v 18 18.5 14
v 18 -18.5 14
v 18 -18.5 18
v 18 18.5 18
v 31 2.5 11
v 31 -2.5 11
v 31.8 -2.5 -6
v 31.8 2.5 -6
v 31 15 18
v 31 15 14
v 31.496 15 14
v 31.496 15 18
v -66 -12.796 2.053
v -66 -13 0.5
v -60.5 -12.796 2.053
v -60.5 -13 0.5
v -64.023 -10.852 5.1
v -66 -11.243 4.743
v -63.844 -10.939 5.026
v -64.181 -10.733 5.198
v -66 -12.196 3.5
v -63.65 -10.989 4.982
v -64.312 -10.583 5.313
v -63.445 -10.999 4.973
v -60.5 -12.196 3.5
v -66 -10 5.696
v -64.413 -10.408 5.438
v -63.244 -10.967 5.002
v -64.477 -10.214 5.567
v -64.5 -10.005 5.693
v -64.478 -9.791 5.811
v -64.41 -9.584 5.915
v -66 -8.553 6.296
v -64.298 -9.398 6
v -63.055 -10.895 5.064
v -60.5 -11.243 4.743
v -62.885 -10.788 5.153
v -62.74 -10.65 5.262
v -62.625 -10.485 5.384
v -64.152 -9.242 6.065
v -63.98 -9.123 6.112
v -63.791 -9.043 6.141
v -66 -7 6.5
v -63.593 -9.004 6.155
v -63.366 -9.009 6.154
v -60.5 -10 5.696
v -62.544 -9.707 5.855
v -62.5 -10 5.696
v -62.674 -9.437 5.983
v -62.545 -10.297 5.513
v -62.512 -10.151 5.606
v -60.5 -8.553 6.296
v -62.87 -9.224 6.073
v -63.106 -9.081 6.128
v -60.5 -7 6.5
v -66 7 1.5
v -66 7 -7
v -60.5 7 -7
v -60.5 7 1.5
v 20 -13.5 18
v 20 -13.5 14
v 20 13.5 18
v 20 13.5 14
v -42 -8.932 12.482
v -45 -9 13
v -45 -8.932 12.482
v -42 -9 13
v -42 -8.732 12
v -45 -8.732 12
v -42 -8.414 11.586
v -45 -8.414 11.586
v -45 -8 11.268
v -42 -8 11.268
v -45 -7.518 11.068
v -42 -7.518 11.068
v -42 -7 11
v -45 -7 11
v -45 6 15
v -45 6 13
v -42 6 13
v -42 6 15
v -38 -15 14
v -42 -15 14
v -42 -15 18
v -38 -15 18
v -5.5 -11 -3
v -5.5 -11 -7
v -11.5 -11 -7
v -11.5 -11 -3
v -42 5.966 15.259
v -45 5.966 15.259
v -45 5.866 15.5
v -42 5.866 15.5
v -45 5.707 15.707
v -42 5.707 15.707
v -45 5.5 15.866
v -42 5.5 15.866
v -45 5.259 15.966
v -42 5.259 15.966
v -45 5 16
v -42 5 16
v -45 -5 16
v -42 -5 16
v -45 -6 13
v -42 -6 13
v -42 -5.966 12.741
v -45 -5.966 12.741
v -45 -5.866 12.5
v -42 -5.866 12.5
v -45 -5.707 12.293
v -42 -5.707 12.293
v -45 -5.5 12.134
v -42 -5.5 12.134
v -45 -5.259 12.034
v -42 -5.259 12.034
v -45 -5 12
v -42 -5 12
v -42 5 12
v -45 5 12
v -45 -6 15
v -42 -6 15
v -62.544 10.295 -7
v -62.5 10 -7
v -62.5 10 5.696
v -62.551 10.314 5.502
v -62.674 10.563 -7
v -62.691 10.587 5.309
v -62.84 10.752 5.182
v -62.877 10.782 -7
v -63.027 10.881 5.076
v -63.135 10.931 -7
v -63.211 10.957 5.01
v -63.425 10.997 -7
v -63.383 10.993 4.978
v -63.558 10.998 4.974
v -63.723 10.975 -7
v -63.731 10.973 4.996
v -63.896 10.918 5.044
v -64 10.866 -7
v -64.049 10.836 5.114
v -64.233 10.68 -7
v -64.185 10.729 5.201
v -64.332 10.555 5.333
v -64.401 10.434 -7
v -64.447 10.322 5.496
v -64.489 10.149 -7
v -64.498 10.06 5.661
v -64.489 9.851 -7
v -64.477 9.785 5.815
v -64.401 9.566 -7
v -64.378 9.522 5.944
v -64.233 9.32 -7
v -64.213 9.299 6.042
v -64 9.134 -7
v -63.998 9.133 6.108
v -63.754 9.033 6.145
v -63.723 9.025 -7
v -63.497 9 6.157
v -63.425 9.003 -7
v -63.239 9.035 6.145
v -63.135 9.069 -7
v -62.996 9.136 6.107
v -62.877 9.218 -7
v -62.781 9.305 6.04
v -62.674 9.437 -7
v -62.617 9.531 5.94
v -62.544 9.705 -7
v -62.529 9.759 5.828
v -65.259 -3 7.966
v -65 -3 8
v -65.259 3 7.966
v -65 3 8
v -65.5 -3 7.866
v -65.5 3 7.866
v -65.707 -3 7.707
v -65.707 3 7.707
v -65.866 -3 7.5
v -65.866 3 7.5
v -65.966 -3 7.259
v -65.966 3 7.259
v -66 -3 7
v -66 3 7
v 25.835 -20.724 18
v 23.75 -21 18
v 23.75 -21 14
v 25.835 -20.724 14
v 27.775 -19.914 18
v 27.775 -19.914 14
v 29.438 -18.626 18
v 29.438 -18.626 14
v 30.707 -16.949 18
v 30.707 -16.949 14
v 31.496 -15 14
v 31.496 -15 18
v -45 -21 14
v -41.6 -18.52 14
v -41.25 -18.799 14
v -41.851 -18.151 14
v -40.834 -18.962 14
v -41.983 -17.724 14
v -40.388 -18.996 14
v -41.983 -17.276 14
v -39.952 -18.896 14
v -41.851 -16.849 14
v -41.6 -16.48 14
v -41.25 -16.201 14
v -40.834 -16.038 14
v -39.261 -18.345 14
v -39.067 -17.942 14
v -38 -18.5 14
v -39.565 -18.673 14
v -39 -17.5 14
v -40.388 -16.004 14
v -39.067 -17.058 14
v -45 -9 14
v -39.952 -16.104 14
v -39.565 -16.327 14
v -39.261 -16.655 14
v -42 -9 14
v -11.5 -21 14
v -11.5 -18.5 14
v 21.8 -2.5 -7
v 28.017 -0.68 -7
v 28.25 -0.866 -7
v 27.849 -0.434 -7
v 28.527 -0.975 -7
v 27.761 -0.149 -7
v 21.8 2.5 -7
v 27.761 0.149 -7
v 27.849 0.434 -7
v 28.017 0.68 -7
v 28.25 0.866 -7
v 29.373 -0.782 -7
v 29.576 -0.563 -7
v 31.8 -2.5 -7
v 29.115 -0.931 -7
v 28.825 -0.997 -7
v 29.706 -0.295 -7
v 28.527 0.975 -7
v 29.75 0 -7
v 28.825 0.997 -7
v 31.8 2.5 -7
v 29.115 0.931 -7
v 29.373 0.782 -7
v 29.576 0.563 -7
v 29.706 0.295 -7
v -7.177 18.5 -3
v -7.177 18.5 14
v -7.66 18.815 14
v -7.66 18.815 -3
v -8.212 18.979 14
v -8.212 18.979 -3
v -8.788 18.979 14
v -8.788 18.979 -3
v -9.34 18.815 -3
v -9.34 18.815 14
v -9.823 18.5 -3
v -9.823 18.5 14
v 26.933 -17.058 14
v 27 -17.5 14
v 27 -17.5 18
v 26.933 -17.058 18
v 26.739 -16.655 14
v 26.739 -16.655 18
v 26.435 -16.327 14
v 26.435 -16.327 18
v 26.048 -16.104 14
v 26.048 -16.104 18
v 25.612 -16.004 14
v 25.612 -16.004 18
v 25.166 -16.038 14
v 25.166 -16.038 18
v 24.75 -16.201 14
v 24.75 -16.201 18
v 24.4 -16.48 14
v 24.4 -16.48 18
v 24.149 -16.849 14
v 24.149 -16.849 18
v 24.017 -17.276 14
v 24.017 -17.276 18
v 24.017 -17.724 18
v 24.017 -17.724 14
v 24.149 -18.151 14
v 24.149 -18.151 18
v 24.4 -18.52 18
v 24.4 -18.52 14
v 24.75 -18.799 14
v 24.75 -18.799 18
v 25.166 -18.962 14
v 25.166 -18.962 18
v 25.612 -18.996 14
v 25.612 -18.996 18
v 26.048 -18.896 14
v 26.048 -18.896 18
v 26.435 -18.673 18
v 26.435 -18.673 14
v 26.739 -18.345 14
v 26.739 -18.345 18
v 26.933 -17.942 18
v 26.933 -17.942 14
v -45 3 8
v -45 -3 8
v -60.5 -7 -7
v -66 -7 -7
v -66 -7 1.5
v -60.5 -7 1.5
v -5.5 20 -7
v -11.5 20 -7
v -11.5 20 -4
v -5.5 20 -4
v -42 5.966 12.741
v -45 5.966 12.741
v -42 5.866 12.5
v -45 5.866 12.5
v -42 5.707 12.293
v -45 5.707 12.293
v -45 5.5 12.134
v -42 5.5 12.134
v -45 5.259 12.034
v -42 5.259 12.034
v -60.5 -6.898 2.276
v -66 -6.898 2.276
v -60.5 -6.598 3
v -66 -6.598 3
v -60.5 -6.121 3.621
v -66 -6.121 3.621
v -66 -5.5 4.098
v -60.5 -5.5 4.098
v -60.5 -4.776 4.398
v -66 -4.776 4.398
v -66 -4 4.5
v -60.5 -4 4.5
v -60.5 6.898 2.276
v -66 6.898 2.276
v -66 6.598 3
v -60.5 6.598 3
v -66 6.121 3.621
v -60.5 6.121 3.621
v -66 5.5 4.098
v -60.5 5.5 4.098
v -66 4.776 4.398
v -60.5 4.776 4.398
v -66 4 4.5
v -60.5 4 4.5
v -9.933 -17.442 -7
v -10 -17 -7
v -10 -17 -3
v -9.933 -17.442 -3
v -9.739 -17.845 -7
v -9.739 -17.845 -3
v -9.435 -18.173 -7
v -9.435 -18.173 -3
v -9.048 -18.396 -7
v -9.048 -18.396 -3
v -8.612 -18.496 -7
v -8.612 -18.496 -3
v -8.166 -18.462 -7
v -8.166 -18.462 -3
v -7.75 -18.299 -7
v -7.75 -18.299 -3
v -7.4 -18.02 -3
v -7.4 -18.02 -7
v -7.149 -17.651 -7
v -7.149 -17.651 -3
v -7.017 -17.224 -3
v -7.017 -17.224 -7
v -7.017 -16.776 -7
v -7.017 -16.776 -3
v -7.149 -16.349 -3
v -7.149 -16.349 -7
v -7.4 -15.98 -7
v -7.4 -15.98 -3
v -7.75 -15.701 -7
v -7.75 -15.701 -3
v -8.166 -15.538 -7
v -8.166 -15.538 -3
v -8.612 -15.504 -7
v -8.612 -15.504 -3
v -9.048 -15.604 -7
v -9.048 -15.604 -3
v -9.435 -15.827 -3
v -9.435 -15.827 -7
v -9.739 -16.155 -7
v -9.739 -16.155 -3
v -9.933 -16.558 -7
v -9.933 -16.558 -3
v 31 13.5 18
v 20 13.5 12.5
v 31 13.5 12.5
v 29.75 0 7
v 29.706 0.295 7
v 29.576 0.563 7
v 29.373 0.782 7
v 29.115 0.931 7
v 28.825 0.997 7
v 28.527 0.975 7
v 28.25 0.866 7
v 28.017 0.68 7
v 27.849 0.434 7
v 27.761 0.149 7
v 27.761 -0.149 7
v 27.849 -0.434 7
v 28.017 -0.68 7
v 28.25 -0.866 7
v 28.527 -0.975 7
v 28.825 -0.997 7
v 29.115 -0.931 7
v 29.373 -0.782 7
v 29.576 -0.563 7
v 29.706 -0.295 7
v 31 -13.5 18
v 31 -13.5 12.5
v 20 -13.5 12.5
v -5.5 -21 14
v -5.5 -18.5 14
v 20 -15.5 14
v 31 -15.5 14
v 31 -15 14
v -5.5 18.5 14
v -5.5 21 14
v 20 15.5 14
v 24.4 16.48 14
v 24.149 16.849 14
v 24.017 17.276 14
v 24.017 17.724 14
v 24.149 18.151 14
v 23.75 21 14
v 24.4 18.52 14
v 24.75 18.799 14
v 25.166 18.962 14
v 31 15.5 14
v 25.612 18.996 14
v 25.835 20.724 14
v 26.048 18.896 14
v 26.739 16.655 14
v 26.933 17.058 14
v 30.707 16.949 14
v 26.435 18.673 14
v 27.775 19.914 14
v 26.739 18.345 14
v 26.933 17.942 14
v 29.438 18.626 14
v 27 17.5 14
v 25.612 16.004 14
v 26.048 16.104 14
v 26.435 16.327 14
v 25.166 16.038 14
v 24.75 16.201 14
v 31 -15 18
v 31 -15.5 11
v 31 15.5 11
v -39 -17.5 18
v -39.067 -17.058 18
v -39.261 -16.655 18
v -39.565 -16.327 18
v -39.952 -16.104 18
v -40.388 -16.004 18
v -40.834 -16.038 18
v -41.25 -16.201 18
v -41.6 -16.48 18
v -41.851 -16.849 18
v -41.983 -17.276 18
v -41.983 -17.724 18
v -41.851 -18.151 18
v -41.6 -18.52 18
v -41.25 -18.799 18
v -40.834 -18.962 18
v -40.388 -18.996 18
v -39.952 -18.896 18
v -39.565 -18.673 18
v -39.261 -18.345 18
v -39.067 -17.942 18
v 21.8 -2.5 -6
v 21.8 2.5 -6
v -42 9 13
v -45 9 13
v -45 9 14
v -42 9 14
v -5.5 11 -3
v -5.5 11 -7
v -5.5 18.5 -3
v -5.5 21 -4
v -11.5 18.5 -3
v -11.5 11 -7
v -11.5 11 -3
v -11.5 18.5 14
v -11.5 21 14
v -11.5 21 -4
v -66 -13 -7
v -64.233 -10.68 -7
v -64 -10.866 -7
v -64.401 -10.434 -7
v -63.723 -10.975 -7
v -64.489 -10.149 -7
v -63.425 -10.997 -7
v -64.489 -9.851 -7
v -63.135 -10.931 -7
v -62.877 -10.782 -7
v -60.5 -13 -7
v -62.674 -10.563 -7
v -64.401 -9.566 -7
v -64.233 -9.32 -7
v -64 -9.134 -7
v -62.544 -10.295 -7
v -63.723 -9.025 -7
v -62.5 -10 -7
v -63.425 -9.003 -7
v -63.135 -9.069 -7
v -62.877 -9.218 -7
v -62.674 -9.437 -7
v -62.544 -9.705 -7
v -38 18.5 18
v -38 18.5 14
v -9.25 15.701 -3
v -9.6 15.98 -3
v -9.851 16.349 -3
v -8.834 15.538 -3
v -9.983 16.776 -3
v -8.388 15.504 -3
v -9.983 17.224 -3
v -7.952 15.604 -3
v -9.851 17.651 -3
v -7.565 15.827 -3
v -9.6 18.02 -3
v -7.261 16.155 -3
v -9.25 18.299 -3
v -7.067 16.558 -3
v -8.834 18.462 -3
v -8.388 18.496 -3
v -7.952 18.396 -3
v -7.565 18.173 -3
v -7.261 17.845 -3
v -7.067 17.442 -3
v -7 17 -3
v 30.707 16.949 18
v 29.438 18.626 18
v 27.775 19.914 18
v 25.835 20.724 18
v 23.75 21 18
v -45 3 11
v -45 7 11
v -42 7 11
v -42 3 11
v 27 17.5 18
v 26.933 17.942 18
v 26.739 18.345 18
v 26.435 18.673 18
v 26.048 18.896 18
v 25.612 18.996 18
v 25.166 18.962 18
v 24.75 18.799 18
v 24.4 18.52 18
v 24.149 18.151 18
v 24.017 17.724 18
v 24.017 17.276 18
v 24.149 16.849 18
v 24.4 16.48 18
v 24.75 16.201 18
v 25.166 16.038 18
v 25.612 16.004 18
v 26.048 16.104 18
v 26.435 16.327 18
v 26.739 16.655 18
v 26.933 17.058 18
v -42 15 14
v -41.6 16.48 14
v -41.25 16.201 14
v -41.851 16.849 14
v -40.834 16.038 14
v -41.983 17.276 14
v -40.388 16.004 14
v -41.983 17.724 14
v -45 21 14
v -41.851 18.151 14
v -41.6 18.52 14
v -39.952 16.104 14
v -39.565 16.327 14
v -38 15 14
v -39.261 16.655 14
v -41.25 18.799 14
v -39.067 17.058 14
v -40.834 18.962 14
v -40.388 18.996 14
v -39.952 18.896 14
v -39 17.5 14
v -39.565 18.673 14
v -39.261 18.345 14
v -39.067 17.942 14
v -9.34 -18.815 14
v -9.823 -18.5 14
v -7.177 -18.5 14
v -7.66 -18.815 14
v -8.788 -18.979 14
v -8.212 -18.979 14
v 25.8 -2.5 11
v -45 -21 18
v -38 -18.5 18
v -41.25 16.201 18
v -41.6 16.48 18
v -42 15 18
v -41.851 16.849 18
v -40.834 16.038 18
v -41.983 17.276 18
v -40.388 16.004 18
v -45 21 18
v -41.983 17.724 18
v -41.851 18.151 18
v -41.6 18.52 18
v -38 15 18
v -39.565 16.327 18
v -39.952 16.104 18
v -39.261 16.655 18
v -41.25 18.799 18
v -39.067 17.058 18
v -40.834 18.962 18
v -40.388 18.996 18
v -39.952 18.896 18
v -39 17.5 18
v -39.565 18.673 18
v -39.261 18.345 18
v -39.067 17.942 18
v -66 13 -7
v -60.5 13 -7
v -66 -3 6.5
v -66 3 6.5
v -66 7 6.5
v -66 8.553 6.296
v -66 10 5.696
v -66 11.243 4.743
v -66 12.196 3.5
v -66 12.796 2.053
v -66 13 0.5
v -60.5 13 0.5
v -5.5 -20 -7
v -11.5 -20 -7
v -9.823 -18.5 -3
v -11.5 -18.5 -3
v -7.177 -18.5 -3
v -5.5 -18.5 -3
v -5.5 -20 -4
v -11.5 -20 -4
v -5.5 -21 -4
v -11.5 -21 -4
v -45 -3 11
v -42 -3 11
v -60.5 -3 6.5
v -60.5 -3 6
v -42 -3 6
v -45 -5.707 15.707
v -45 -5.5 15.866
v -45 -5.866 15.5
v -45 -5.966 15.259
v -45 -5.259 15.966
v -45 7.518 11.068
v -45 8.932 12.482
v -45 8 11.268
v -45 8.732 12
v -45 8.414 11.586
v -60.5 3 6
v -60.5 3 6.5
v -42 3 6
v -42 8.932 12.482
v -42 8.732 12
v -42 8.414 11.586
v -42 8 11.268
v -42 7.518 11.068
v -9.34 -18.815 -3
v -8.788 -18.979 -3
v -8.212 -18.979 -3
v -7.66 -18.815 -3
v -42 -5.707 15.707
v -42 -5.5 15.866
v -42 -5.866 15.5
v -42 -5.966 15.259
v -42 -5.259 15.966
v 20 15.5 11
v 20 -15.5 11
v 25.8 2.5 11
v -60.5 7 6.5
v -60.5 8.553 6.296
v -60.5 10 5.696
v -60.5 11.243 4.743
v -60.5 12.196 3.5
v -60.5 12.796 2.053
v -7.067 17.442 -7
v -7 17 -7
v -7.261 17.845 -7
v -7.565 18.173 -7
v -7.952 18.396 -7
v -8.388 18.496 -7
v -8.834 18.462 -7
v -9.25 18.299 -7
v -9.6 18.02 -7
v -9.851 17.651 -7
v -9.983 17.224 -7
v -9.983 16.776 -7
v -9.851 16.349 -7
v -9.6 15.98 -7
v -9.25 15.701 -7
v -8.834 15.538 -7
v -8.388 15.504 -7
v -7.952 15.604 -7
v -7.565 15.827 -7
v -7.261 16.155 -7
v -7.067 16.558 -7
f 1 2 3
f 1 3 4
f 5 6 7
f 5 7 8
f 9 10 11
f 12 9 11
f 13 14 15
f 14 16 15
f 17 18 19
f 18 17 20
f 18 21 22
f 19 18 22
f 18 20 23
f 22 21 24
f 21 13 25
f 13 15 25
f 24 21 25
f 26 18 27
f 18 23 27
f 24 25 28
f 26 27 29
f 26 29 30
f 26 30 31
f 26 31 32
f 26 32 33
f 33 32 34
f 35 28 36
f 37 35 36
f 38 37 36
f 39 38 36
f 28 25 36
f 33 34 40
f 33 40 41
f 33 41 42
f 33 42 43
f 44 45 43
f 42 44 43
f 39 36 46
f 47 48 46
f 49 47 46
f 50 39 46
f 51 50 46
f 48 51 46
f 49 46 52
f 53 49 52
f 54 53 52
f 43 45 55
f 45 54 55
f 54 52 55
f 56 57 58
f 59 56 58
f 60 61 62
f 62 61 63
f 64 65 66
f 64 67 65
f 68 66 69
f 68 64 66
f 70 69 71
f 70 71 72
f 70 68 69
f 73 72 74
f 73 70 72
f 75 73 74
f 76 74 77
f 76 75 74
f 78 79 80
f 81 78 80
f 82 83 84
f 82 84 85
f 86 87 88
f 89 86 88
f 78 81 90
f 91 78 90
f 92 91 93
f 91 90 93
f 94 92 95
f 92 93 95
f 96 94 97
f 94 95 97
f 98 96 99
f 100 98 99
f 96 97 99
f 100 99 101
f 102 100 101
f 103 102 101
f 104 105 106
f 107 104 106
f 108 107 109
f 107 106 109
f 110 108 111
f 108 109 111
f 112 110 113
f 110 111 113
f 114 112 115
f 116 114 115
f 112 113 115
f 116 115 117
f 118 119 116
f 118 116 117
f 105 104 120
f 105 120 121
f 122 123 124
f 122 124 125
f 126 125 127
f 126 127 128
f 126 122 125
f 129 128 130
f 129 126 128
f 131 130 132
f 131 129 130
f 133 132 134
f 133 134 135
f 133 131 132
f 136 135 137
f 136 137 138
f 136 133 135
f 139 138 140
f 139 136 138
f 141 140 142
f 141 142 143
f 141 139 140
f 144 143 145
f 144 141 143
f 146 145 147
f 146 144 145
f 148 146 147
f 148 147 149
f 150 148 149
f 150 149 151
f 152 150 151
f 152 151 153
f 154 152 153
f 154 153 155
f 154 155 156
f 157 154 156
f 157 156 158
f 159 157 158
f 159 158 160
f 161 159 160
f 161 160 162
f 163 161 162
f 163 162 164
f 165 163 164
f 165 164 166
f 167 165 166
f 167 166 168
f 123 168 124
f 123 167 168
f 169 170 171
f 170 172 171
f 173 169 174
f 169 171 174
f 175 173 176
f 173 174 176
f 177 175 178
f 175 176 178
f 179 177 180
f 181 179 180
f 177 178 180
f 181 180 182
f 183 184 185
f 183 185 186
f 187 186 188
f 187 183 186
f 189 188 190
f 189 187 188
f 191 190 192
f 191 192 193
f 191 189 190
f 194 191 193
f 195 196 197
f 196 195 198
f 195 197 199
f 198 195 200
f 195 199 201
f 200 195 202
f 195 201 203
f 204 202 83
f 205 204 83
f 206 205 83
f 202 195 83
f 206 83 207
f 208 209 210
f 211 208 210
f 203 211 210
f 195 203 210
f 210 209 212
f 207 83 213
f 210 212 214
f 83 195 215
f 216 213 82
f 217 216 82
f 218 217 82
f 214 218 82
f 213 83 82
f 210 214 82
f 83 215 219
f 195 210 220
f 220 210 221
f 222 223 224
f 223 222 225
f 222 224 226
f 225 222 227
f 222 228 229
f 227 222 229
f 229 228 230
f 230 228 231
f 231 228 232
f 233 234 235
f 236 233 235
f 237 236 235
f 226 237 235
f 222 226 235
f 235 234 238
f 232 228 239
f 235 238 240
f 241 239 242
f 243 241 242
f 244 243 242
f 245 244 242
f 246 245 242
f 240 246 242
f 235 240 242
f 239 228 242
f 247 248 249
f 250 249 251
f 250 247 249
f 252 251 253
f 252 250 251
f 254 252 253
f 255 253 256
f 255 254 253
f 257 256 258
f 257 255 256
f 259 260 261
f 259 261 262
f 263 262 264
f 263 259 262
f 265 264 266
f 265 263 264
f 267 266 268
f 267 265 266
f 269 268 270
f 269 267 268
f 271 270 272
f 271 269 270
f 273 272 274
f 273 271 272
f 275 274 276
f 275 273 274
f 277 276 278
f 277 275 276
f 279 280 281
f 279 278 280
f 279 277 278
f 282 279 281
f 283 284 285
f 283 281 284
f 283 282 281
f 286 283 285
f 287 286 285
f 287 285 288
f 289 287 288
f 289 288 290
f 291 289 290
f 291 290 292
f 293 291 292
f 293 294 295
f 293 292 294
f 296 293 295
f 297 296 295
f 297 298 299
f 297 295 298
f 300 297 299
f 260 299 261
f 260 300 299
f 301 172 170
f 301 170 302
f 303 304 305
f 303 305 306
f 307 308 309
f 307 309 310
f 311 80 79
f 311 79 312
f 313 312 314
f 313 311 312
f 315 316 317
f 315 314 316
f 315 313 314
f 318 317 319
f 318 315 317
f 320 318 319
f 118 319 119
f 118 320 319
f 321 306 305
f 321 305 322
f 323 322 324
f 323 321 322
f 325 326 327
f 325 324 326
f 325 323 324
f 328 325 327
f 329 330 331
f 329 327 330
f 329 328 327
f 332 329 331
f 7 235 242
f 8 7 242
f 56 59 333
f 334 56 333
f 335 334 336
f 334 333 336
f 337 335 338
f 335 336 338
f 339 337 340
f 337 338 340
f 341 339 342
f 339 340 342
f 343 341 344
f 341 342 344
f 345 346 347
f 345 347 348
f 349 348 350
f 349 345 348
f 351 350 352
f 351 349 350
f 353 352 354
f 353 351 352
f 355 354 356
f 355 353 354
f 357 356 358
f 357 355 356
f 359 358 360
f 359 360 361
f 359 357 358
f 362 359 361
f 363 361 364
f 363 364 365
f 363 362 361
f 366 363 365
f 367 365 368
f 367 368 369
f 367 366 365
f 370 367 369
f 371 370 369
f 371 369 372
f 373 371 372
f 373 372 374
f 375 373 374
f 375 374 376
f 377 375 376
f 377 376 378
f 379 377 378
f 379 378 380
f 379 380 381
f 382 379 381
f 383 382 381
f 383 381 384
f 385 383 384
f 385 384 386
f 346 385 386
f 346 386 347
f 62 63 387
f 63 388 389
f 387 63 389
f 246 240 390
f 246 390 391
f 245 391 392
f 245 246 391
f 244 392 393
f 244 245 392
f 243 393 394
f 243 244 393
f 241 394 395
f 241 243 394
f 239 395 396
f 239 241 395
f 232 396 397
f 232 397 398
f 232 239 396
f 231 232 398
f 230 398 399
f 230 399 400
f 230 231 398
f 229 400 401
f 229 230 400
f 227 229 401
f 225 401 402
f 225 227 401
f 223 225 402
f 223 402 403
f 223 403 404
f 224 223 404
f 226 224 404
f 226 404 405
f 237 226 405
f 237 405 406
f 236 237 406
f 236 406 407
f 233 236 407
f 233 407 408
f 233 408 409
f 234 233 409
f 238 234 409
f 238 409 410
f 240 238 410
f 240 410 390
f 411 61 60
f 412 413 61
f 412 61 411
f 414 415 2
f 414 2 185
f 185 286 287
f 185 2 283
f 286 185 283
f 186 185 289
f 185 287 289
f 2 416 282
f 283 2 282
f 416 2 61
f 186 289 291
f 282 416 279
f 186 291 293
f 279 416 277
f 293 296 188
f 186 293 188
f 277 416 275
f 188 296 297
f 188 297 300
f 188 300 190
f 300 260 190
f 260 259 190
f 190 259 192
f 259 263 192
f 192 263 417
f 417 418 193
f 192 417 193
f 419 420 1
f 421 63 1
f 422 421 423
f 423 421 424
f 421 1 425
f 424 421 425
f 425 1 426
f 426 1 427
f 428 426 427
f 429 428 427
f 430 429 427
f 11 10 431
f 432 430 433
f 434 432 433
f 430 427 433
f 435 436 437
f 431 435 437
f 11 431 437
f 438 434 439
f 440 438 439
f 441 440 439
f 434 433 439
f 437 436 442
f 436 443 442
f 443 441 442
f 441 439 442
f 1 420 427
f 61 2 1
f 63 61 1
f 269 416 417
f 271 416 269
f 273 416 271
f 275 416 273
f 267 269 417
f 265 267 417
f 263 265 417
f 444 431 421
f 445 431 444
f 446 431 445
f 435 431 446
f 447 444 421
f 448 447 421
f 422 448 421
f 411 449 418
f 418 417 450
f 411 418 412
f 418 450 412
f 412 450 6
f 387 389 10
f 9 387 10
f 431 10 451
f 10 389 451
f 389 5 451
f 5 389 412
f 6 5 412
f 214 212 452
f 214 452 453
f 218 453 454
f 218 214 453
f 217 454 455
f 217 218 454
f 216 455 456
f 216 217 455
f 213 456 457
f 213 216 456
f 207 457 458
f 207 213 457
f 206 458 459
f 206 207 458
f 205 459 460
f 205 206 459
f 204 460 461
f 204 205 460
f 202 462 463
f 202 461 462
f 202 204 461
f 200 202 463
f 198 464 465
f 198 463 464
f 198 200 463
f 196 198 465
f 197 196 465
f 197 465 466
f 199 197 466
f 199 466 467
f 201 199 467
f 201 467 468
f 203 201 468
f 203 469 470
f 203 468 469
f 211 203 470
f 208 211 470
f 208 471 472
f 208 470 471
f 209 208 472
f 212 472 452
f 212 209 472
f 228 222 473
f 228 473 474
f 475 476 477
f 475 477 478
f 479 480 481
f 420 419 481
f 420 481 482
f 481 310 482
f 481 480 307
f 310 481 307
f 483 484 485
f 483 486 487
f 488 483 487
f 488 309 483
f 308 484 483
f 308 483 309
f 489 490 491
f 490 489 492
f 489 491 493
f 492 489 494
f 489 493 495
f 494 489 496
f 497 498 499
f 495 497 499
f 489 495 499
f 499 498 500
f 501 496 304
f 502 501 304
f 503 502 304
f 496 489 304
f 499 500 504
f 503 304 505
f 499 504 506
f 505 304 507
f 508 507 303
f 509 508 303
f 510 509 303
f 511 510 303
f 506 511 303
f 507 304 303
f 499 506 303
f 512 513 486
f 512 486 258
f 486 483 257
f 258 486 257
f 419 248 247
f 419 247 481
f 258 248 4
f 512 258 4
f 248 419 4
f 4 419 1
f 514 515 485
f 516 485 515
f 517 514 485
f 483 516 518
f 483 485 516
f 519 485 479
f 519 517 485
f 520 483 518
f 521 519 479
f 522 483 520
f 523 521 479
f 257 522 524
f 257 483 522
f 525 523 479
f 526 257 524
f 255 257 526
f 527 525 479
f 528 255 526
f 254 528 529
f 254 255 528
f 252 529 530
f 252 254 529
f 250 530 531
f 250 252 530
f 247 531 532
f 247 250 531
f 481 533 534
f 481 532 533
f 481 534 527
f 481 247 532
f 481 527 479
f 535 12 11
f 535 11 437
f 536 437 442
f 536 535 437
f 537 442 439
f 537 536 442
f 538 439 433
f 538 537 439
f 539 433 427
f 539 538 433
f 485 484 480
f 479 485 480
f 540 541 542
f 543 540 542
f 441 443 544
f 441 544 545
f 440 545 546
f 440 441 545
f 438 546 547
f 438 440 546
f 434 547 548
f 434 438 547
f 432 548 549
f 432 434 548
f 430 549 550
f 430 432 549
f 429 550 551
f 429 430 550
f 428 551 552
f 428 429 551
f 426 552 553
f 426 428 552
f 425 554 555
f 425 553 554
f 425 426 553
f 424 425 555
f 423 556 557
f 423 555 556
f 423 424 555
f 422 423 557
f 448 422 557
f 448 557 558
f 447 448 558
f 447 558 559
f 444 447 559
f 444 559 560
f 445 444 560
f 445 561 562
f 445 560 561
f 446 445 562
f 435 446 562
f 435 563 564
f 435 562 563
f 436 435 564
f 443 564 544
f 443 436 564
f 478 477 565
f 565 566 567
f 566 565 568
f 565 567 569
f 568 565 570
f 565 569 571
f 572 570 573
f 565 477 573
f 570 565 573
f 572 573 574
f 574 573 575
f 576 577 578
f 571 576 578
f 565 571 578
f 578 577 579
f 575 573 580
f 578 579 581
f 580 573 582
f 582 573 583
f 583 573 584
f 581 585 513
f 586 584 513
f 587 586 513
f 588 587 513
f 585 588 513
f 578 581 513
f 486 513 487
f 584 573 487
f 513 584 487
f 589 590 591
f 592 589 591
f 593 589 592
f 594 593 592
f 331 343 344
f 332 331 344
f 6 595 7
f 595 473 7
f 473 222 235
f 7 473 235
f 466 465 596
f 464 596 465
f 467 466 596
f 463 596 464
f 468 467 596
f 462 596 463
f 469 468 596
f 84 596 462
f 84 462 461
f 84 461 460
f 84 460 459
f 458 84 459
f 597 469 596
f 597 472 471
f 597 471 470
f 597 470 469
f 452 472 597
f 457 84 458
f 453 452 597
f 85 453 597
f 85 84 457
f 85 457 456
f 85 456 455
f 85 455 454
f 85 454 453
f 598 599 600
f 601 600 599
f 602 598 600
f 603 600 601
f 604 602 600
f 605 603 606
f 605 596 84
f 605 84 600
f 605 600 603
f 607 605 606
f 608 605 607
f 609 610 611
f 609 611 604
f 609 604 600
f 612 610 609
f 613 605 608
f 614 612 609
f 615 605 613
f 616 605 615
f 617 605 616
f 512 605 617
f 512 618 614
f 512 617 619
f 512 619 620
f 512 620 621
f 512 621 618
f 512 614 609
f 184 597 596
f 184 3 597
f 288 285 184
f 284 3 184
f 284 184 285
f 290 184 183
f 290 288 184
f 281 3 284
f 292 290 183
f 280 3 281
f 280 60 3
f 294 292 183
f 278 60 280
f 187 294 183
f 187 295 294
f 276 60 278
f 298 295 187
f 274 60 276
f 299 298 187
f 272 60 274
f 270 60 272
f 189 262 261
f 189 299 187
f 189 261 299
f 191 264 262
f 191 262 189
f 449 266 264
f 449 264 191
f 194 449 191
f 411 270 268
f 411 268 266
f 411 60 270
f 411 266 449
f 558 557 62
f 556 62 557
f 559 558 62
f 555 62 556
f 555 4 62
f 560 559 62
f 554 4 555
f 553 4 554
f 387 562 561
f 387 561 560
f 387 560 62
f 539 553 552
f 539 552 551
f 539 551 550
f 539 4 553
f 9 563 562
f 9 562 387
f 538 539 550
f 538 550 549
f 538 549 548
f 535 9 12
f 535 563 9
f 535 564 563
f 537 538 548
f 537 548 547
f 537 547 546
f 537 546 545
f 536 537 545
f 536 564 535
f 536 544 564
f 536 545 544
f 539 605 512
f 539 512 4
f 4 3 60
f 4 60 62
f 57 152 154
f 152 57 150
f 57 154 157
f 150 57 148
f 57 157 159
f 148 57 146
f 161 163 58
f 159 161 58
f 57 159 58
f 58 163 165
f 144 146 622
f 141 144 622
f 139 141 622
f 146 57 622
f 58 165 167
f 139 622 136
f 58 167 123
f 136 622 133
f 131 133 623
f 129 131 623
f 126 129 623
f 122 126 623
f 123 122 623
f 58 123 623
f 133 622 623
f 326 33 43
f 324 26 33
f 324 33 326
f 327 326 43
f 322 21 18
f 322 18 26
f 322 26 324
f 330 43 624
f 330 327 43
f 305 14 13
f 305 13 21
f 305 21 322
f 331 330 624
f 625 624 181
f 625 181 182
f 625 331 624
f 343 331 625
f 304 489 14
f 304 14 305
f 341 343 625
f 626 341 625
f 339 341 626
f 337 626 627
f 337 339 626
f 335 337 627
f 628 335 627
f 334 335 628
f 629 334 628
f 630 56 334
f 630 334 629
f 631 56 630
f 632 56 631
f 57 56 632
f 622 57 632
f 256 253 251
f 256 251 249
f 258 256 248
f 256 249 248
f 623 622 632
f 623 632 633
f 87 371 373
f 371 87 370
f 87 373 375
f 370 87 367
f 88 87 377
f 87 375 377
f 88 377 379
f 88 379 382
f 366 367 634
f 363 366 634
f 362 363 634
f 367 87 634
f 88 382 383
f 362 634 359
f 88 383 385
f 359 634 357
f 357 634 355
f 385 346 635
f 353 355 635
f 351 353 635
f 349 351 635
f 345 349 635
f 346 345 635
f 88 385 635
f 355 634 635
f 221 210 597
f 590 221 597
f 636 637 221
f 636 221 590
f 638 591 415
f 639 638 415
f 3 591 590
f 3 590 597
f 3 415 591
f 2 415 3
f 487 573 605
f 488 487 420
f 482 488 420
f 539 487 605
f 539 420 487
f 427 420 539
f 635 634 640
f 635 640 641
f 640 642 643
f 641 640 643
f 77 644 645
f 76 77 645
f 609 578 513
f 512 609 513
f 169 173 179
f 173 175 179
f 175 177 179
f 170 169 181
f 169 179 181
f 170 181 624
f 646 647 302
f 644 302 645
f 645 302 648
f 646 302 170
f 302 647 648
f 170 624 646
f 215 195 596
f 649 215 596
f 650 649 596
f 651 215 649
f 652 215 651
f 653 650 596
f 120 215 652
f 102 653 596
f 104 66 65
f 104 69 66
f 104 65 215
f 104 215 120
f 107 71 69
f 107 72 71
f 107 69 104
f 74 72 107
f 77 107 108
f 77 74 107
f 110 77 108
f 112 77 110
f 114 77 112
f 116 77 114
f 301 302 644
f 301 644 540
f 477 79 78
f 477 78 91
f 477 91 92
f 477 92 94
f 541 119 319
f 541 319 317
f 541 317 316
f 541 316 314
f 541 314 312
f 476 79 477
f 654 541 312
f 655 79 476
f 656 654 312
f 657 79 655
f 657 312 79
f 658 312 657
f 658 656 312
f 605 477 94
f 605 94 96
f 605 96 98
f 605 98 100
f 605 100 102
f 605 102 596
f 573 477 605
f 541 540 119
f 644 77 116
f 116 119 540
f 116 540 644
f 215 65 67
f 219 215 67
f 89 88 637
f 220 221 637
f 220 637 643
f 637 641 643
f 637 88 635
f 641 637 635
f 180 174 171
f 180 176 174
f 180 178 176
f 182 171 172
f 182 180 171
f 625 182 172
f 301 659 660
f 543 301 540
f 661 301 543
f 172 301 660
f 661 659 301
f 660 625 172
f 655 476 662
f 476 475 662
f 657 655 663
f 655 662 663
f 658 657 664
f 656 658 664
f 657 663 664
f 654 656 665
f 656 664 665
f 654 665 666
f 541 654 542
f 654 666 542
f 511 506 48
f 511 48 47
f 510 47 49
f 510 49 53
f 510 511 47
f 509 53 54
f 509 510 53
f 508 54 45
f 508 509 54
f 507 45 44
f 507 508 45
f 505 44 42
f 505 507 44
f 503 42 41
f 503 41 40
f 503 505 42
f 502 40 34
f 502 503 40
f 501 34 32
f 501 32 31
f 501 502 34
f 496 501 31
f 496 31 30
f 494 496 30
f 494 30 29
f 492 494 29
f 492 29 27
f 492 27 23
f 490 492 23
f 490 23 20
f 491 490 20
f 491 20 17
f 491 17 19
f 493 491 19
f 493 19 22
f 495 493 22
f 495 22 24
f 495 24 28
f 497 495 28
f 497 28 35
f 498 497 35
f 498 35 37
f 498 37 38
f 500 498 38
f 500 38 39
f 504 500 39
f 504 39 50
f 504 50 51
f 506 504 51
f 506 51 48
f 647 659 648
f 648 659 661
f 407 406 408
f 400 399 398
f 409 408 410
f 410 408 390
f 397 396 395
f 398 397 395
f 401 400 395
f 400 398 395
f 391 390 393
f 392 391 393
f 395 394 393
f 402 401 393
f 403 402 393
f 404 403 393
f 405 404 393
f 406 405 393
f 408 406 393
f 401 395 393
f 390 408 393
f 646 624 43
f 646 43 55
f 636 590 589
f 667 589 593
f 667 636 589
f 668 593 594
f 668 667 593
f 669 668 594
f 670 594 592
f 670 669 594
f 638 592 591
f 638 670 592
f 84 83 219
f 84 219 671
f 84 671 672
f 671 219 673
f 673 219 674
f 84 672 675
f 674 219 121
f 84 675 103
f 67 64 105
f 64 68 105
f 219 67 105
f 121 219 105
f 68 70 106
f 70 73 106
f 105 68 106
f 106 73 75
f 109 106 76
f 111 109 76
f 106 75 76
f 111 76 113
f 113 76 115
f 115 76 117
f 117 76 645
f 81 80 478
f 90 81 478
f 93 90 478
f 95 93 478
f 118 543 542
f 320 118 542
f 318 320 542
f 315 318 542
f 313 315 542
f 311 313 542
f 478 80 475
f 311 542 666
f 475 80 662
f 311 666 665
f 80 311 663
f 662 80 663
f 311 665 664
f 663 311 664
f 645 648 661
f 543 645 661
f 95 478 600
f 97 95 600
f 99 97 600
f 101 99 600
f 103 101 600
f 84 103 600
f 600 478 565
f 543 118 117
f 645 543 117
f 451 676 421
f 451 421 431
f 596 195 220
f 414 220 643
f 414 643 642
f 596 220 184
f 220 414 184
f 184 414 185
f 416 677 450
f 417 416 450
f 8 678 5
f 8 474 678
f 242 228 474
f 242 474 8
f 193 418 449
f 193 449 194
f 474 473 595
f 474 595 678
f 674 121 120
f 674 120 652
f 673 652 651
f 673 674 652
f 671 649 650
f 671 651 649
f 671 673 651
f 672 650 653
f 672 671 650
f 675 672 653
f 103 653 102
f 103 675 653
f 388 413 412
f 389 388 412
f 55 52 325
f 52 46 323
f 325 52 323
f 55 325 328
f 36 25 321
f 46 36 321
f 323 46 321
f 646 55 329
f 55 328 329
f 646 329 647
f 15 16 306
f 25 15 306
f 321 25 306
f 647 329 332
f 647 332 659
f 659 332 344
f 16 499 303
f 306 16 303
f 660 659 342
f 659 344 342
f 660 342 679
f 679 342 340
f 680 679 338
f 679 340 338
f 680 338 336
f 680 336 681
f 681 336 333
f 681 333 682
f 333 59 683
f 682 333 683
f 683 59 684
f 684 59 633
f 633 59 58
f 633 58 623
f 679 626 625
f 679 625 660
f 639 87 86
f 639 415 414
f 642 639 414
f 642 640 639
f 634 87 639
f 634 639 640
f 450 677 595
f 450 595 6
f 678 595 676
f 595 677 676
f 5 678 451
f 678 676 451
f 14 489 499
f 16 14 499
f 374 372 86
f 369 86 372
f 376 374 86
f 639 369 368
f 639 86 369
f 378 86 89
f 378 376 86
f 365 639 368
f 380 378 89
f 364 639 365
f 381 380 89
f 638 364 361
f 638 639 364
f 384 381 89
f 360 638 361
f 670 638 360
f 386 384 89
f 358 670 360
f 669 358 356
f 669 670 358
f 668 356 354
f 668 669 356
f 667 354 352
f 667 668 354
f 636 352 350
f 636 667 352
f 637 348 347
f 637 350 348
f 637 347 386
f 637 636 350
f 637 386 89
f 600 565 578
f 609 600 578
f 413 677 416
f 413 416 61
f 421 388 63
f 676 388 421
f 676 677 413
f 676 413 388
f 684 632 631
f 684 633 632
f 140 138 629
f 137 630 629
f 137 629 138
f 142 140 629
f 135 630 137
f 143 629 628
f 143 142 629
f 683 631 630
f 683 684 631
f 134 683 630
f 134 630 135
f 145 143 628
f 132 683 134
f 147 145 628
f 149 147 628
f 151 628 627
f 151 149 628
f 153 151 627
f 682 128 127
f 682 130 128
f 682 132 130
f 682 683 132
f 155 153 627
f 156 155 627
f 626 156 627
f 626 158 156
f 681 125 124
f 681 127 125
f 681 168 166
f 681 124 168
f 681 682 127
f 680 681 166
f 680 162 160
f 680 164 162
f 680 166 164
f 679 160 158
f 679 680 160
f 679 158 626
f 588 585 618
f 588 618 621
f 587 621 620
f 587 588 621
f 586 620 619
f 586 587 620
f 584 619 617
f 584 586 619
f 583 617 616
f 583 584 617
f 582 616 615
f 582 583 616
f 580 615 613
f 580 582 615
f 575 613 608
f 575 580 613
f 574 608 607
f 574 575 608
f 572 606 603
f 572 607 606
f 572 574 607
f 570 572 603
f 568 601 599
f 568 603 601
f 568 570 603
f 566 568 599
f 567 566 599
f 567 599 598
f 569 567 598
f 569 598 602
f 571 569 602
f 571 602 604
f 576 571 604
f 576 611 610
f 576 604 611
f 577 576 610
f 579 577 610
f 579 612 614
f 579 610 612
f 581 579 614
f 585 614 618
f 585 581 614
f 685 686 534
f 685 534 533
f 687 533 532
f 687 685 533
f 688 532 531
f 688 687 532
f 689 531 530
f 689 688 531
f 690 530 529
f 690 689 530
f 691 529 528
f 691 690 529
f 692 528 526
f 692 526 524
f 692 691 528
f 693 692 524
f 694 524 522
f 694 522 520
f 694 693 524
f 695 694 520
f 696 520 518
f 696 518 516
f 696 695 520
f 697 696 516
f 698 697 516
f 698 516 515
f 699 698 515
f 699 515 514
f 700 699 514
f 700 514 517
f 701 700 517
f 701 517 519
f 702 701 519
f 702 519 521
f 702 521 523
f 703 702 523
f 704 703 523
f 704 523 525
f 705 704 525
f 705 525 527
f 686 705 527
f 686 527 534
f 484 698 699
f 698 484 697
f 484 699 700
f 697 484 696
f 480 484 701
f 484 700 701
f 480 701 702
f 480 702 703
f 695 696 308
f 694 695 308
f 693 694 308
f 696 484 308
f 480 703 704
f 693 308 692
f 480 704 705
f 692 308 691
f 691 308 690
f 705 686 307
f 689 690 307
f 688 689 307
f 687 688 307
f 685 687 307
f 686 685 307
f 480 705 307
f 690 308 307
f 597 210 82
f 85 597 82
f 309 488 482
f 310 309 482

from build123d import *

# Parameters (mm, degrees)
BOX148_W               = 10
BOX148_H               = 12
BOX148_DEPTH           = 4
FILLET092_R            = 1
CYLINDER225_R          = 1
CYLINDER225_DEPTH      = 17
BOX132_W               = 10
BOX132_H               = 5
BOX132_DEPTH           = 18
CHAMFER021_1_SIZE2     = 4
CHAMFER021_1_SIZE      = 17
CHAMFER021_2_SIZE2     = 0.8
CHAMFER021_2_SIZE      = 17
BOX116_W               = 56
BOX116_H               = 37
BOX116_DEPTH           = 6
BOX130_W               = 60
BOX130_H               = 30
BOX130_DEPTH           = 6
CYLINDER224_R          = 1.5
CYLINDER224_DEPTH      = 12
BOX131_W               = 12
BOX131_H               = 30
BOX131_DEPTH           = 6
CYLINDER222_R          = 1.5
CYLINDER222_DEPTH      = 12
CYLINDER221_R          = 1.5
CYLINDER221_DEPTH      = 12
CYLINDER223_R          = 1.5
CYLINDER223_DEPTH      = 12
BOX134_W               = 25
BOX134_H               = 45
BOX134_DEPTH           = 6
BOX097_W               = 100
BOX097_H               = 42
BOX097_DEPTH           = 4
FILLET082_R            = 8
CYLINDER226_R          = 1.5
CYLINDER226_DEPTH      = 21
BOX138_W               = 8
BOX138_H               = 10
BOX138_DEPTH           = 21
BOX137_W               = 8
BOX137_H               = 10
BOX137_DEPTH           = 21
CYLINDER228_R          = 2
CYLINDER228_DEPTH      = 21
BOX110_W               = 56
BOX110_H               = 1
BOX110_DEPTH           = 3
BOX136_W               = 6
BOX136_H               = 10
BOX136_DEPTH           = 21
CYLINDER227_R          = 1.5
CYLINDER227_DEPTH      = 21
BOX141_W               = 8
BOX141_H               = 10
BOX141_DEPTH           = 21
BOX140_W               = 8
BOX140_H               = 10
BOX140_DEPTH           = 21
CYLINDER229_R          = 2
CYLINDER229_DEPTH      = 21
BOX139_W               = 56
BOX139_H               = 1
BOX139_DEPTH           = 3
BOX142_W               = 6
BOX142_H               = 10
BOX142_DEPTH           = 21
CUT100_PLACEMENT_ANGLE = 180
BOX143_W               = 14
BOX143_H               = 27
BOX143_DEPTH           = 8
BOX144_W               = 11
BOX144_H               = 31
BOX144_DEPTH           = 7
CYLINDER233_R          = 1
CYLINDER233_DEPTH      = 19
CYLINDER232_R          = 1
CYLINDER232_DEPTH      = 19
BOX152_W               = 8.5
BOX152_H               = 14
BOX152_DEPTH           = 11.5
FILLET095_R            = 3
BOX151_W               = 5.5
BOX151_H               = 26
BOX151_DEPTH           = 13.5
FILLET093_R            = 6
BOX150_W               = 24
BOX150_H               = 6
BOX150_DEPTH           = 2
BOX147_W               = 3
BOX147_H               = 18
BOX147_DEPTH           = 4
FILLET090_R            = 2
BOX149_W               = 3
BOX149_H               = 6
BOX149_DEPTH           = 6
FILLET094_R            = 1


with BuildPart() as fillet092:
    # Box148 → Box148 (new body)
    with BuildSketch(Plane(origin=(-51, -6, 12), x_dir=(1, 0, 0), z_dir=(0, 0, 1))):
        with Locations((5, 6)):
            Rectangle(BOX148_W, BOX148_H)
    extrude(amount=BOX148_DEPTH)

    # Fillet092
    fillet092_edges = [fillet092.edges().sort_by_distance(p)[0] for p in [
        (-46, -6, 12),
        (-46, -6, 16),
        (-46, 6, 12),
        (-46, 6, 16),
    ]]
    fillet(fillet092_edges, radius=FILLET092_R)


with BuildPart() as zylinder225:
    # Cylinder225 → Cylinder225 (new body)
    with BuildSketch(Plane(origin=(28.75, 0, -10), x_dir=(1, 0, 0), z_dir=(0, 0, 1))):
        Circle(CYLINDER225_R)
    extrude(amount=CYLINDER225_DEPTH)


with BuildPart() as cut098:
    # Box132 → Box132 (new body)
    with BuildSketch(Plane(origin=(21.8, -2.5, -7), x_dir=(1, 0, 0), z_dir=(0, 0, 1))):
        with Locations((5, 2.5)):
            Rectangle(BOX132_W, BOX132_H)
    extrude(amount=BOX132_DEPTH)

    # Chamfer021 1
    chamfer021_1_edges = [cut098.edges().sort_by_distance(p)[0] for p in [
        (21.8, 0, 11),
    ]]
    chamfer021_1_side = cut098.faces().sort_by_distance((21.8, 0, 2))[0]
    chamfer(chamfer021_1_edges, length=CHAMFER021_1_SIZE, length2=CHAMFER021_1_SIZE2, reference=chamfer021_1_side)

    # Chamfer021 2
    chamfer021_2_edges = [cut098.edges().sort_by_distance(p)[0] for p in [
        (31.8, 0, 11),
    ]]
    chamfer021_2_side = cut098.faces().sort_by_distance((31.8, 0, 2))[0]
    chamfer(chamfer021_2_edges, length=CHAMFER021_2_SIZE, length2=CHAMFER021_2_SIZE2, reference=chamfer021_2_side)

    # Cut098: cut Zylinder225
    add(zylinder225.part, mode=Mode.SUBTRACT)


with BuildPart() as w_rfel110:
    # Box116 → Box116 (new body)
    with BuildSketch(Plane(origin=(-38, -18.5, 13), x_dir=(1, 0, 0), z_dir=(0, 0, 1))):
        with Locations((28, 18.5)):
            Rectangle(BOX116_W, BOX116_H)
    extrude(amount=BOX116_DEPTH)


with BuildPart() as w_rfel120:
    # Box130 → Box130 (new body)
    with BuildSketch(Plane(origin=(-42, -15, 13), x_dir=(1, 0, 0), z_dir=(0, 0, 1))):
        with Locations((30, 15)):
            Rectangle(BOX130_W, BOX130_H)
    extrude(amount=BOX130_DEPTH)


with BuildPart() as zylinder224:
    # Cylinder224 → Cylinder224 (new body)
    with BuildSketch(Plane(origin=(25.5, 17.5, 8), x_dir=(1, 0, 0), z_dir=(0, 0, 1))):
        Circle(CYLINDER224_R)
    extrude(amount=CYLINDER224_DEPTH)


with BuildPart() as w_rfel121:
    # Box131 → Box131 (new body)
    with BuildSketch(Plane(origin=(20, -15, 13), x_dir=(1, 0, 0), z_dir=(0, 0, 1))):
        with Locations((6, 15)):
            Rectangle(BOX131_W, BOX131_H)
    extrude(amount=BOX131_DEPTH)


with BuildPart() as zylinder222:
    # Cylinder222 → Cylinder222 (new body)
    with BuildSketch(Plane(origin=(-40.5, -17.5, 8), x_dir=(1, 0, 0), z_dir=(0, 0, 1))):
        Circle(CYLINDER222_R)
    extrude(amount=CYLINDER222_DEPTH)


with BuildPart() as zylinder221:
    # Cylinder221 → Cylinder221 (new body)
    with BuildSketch(Plane(origin=(-40.5, 17.5, 8), x_dir=(1, 0, 0), z_dir=(0, 0, 1))):
        Circle(CYLINDER221_R)
    extrude(amount=CYLINDER221_DEPTH)


with BuildPart() as zylinder223:
    # Cylinder223 → Cylinder223 (new body)
    with BuildSketch(Plane(origin=(25.5, -17.5, 8), x_dir=(1, 0, 0), z_dir=(0, 0, 1))):
        Circle(CYLINDER223_R)
    extrude(amount=CYLINDER223_DEPTH)


with BuildPart() as fusion142:
    # Box134 → Box134 (new body)
    with BuildSketch(Plane(origin=(-70, -22.5, 13), x_dir=(1, 0, 0), z_dir=(0, 0, 1))):
        with Locations((12.5, 22.5)):
            Rectangle(BOX134_W, BOX134_H)
    extrude(amount=BOX134_DEPTH)

    # Fusion142: union Würfel110, Würfel120, Zylinder224, Würfel121, Zylinder222, Zylinder221, Zylinder223
    add(w_rfel110.part)
    add(w_rfel120.part)
    add(zylinder224.part)
    add(w_rfel121.part)
    add(zylinder222.part)
    add(zylinder221.part)
    add(zylinder223.part)


with BuildPart() as cut097:
    # Box097 → Box097 (new body)
    with BuildSketch(Plane(origin=(-68.25, -21, 14), x_dir=(1, 0, 0), z_dir=(0, 0, 1))):
        with Locations((50, 21)):
            Rectangle(BOX097_W, BOX097_H)
    extrude(amount=BOX097_DEPTH)

    # Fillet082
    fillet082_edges = [cut097.edges().sort_by_distance(p)[0] for p in [
        (-68.25, -21, 16),
        (-68.25, 21, 16),
        (31.75, -21, 16),
        (31.75, 21, 16),
    ]]
    fillet(fillet082_edges, radius=FILLET082_R)

    # Cut097: cut Fusion142
    add(fusion142.part, mode=Mode.SUBTRACT)


with BuildPart() as zylinder226:
    # Cylinder226 → Cylinder226 (new body)
    with BuildSketch(Plane(origin=(-8.5, 17, -10), x_dir=(1, 0, 0), z_dir=(0, 0, 1))):
        Circle(CYLINDER226_R)
    extrude(amount=CYLINDER226_DEPTH)


with BuildPart() as w_rfel128:
    # Box138 → Box138 (new body)
    with BuildSketch(Plane(origin=(-12.5, 8.5, -3), x_dir=(1, 0, 0), z_dir=(0, 0, 1))):
        with Locations((4, 5)):
            Rectangle(BOX138_W, BOX138_H)
    extrude(amount=BOX138_DEPTH)


with BuildPart() as w_rfel127:
    # Box137 → Box137 (new body)
    with BuildSketch(Plane(origin=(-12.5, 5.5, -3), x_dir=(1, 0, 0), z_dir=(0, 0, 1))):
        with Locations((4, 5)):
            Rectangle(BOX137_W, BOX137_H)
    extrude(amount=BOX137_DEPTH)


with BuildPart() as zylinder228:
    # Cylinder228 → Cylinder228 (new body)
    with BuildSketch(Plane(origin=(-8.5, 17, -3), x_dir=(1, 0, 0), z_dir=(0, 0, 1))):
        Circle(CYLINDER228_R)
    extrude(amount=CYLINDER228_DEPTH)


with BuildPart() as fusion144:
    # Box110 → Box110 (new body)
    with BuildSketch(Plane(origin=(-43.5, 20, -7), x_dir=(1, 0, 0), z_dir=(0, 0, 1))):
        with Locations((28, 0.5)):
            Rectangle(BOX110_W, BOX110_H)
    extrude(amount=BOX110_DEPTH)

    # Fusion144: union Zylinder226, Würfel128, Würfel127, Zylinder228
    add(zylinder226.part)
    add(w_rfel128.part)
    add(w_rfel127.part)
    add(zylinder228.part)


with BuildPart() as cut099:
    # Box136 → Box136 (new body)
    with BuildSketch(Plane(origin=(-11.5, 11, -7), x_dir=(1, 0, 0), z_dir=(0, 0, 1))):
        with Locations((3, 5)):
            Rectangle(BOX136_W, BOX136_H)
    extrude(amount=BOX136_DEPTH)

    # Cut099: cut Fusion144
    add(fusion144.part, mode=Mode.SUBTRACT)


with BuildPart() as zylinder227:
    # Cylinder227 → Cylinder227 (new body)
    with BuildSketch(Plane(origin=(-8.5, 17, -10), x_dir=(1, 0, 0), z_dir=(0, 0, 1))):
        Circle(CYLINDER227_R)
    extrude(amount=CYLINDER227_DEPTH)


with BuildPart() as w_rfel131:
    # Box141 → Box141 (new body)
    with BuildSketch(Plane(origin=(-12.5, 8.5, -3), x_dir=(1, 0, 0), z_dir=(0, 0, 1))):
        with Locations((4, 5)):
            Rectangle(BOX141_W, BOX141_H)
    extrude(amount=BOX141_DEPTH)


with BuildPart() as w_rfel130:
    # Box140 → Box140 (new body)
    with BuildSketch(Plane(origin=(-12.5, 5.5, -3), x_dir=(1, 0, 0), z_dir=(0, 0, 1))):
        with Locations((4, 5)):
            Rectangle(BOX140_W, BOX140_H)
    extrude(amount=BOX140_DEPTH)


with BuildPart() as zylinder229:
    # Cylinder229 → Cylinder229 (new body)
    with BuildSketch(Plane(origin=(-8.5, 17, -3), x_dir=(1, 0, 0), z_dir=(0, 0, 1))):
        Circle(CYLINDER229_R)
    extrude(amount=CYLINDER229_DEPTH)


with BuildPart() as fusion145:
    # Box139 → Box139 (new body)
    with BuildSketch(Plane(origin=(-43.5, 20, -7), x_dir=(1, 0, 0), z_dir=(0, 0, 1))):
        with Locations((28, 0.5)):
            Rectangle(BOX139_W, BOX139_H)
    extrude(amount=BOX139_DEPTH)

    # Fusion145: union Zylinder227, Würfel131, Würfel130, Zylinder229
    add(zylinder227.part)
    add(w_rfel131.part)
    add(w_rfel130.part)
    add(zylinder229.part)


with BuildPart() as cut100:
    # Box142 → Box142 (new body)
    with BuildSketch(Plane(origin=(-11.5, 11, -7), x_dir=(1, 0, 0), z_dir=(0, 0, 1))):
        with Locations((3, 5)):
            Rectangle(BOX142_W, BOX142_H)
    extrude(amount=BOX142_DEPTH)

    # Cut100: cut Fusion145
    add(fusion145.part, mode=Mode.SUBTRACT)


with BuildPart() as cut100_1:
    # Cut100 placement: moved
    add(cut100.part.moved(Location((-17, 0, 0))).rotate(Axis((-17, 0, 0), (0, 0, 1)), CUT100_PLACEMENT_ANGLE))


with BuildPart() as w_rfel133:
    # Box143 → Box143 (new body)
    with BuildSketch(Plane(origin=(19, -13.5, 12.5), x_dir=(1, 0, 0), z_dir=(0, 0, 1))):
        with Locations((7, 13.5)):
            Rectangle(BOX143_W, BOX143_H)
    extrude(amount=BOX143_DEPTH)


with BuildPart() as cut101:
    # Box144 → Box144 (new body)
    with BuildSketch(Plane(origin=(20, -15.5, 11), x_dir=(1, 0, 0), z_dir=(0, 0, 1))):
        with Locations((5.5, 15.5)):
            Rectangle(BOX144_W, BOX144_H)
    extrude(amount=BOX144_DEPTH)

    # Cut101: cut Würfel133
    add(w_rfel133.part, mode=Mode.SUBTRACT)


with BuildPart() as zylinder233:
    # Cylinder233 → Cylinder233 (new body)
    with BuildSketch(Plane(origin=(-63.5, 10, -10), x_dir=(1, 0, 0), z_dir=(0, 0, 1))):
        Circle(CYLINDER233_R)
    extrude(amount=CYLINDER233_DEPTH)


with BuildPart() as zylinder232:
    # Cylinder232 → Cylinder232 (new body)
    with BuildSketch(Plane(origin=(-63.5, -10, -10), x_dir=(1, 0, 0), z_dir=(0, 0, 1))):
        Circle(CYLINDER232_R)
    extrude(amount=CYLINDER232_DEPTH)


with BuildPart() as fusion149:
    # Box152 → Box152 (new body)
    with BuildSketch(Plane(origin=(-67, -10, -7), x_dir=(1, 0, 0), z_dir=(0, 0, 1))):
        with Locations((4.25, 7)):
            Rectangle(BOX152_W, BOX152_H)
    extrude(amount=BOX152_DEPTH)

    # Fillet095
    fillet095_edges = [fusion149.edges().sort_by_distance(p)[0] for p in [
        (-62.75, -10, 4.5),
        (-62.75, 4, 4.5),
    ]]
    fillet(fillet095_edges, radius=FILLET095_R)


with BuildPart() as fusion149_1:
    # Fillet095 placement: moved
    add(fusion149.part.moved(Location((0, 3, 0))))

    # Fusion149: union Zylinder233, Zylinder232
    add(zylinder233.part)
    add(zylinder232.part)


with BuildPart() as cut104:
    # Box151 → Box151 (new body)
    with BuildSketch(Plane(origin=(-66, -13, -7), x_dir=(1, 0, 0), z_dir=(0, 0, 1))):
        with Locations((2.75, 13)):
            Rectangle(BOX151_W, BOX151_H)
    extrude(amount=BOX151_DEPTH)

    # Fillet093
    fillet093_edges = [cut104.edges().sort_by_distance(p)[0] for p in [
        (-63.25, -13, 6.5),
        (-63.25, 13, 6.5),
    ]]
    fillet(fillet093_edges, radius=FILLET093_R)

    # Cut104: cut Fusion149
    add(fusion149_1.part, mode=Mode.SUBTRACT)


with BuildPart() as w_rfel140:
    # Box150 → Box150 (new body)
    with BuildSketch(Plane(origin=(-66, -3, 6), x_dir=(1, 0, 0), z_dir=(0, 0, 1))):
        with Locations((12, 3)):
            Rectangle(BOX150_W, BOX150_H)
    extrude(amount=BOX150_DEPTH)


with BuildPart() as fillet090:
    # Box147 → Box147 (new body)
    with BuildSketch(Plane(origin=(-45, -9, 11), x_dir=(1, 0, 0), z_dir=(0, 0, 1))):
        with Locations((1.5, 9)):
            Rectangle(BOX147_W, BOX147_H)
    extrude(amount=BOX147_DEPTH)

    # Fillet090
    fillet090_edges = [fillet090.edges().sort_by_distance(p)[0] for p in [
        (-43.5, -9, 11),
        (-43.5, 9, 11),
    ]]
    fillet(fillet090_edges, radius=FILLET090_R)


with BuildPart() as cut108:
    # Box149 → Box149 (new body)
    with BuildSketch(Plane(origin=(-45, -3, 6), x_dir=(1, 0, 0), z_dir=(0, 0, 1))):
        with Locations((1.5, 3)):
            Rectangle(BOX149_W, BOX149_H)
    extrude(amount=BOX149_DEPTH)

    # Fusion148: union Würfel140, Fillet090
    add(w_rfel140.part)
    add(fillet090.part)

    # Fillet094
    fillet094_edges = [cut108.edges().sort_by_distance(p)[0] for p in [
        (-66, 0, 8),
    ]]
    fillet(fillet094_edges, radius=FILLET094_R)

    # Fusion150: union Cut104
    add(cut104.part)

    # Fusion157: union Cut098, Cut097, Cut099, Cut100, Cut101
    add(cut098.part)
    add(cut097.part)
    add(cut099.part)
    add(cut100_1.part)
    add(cut101.part)

    # Cut108: cut Fillet092
    add(fillet092.part, mode=Mode.SUBTRACT)


solid = cut108.part
